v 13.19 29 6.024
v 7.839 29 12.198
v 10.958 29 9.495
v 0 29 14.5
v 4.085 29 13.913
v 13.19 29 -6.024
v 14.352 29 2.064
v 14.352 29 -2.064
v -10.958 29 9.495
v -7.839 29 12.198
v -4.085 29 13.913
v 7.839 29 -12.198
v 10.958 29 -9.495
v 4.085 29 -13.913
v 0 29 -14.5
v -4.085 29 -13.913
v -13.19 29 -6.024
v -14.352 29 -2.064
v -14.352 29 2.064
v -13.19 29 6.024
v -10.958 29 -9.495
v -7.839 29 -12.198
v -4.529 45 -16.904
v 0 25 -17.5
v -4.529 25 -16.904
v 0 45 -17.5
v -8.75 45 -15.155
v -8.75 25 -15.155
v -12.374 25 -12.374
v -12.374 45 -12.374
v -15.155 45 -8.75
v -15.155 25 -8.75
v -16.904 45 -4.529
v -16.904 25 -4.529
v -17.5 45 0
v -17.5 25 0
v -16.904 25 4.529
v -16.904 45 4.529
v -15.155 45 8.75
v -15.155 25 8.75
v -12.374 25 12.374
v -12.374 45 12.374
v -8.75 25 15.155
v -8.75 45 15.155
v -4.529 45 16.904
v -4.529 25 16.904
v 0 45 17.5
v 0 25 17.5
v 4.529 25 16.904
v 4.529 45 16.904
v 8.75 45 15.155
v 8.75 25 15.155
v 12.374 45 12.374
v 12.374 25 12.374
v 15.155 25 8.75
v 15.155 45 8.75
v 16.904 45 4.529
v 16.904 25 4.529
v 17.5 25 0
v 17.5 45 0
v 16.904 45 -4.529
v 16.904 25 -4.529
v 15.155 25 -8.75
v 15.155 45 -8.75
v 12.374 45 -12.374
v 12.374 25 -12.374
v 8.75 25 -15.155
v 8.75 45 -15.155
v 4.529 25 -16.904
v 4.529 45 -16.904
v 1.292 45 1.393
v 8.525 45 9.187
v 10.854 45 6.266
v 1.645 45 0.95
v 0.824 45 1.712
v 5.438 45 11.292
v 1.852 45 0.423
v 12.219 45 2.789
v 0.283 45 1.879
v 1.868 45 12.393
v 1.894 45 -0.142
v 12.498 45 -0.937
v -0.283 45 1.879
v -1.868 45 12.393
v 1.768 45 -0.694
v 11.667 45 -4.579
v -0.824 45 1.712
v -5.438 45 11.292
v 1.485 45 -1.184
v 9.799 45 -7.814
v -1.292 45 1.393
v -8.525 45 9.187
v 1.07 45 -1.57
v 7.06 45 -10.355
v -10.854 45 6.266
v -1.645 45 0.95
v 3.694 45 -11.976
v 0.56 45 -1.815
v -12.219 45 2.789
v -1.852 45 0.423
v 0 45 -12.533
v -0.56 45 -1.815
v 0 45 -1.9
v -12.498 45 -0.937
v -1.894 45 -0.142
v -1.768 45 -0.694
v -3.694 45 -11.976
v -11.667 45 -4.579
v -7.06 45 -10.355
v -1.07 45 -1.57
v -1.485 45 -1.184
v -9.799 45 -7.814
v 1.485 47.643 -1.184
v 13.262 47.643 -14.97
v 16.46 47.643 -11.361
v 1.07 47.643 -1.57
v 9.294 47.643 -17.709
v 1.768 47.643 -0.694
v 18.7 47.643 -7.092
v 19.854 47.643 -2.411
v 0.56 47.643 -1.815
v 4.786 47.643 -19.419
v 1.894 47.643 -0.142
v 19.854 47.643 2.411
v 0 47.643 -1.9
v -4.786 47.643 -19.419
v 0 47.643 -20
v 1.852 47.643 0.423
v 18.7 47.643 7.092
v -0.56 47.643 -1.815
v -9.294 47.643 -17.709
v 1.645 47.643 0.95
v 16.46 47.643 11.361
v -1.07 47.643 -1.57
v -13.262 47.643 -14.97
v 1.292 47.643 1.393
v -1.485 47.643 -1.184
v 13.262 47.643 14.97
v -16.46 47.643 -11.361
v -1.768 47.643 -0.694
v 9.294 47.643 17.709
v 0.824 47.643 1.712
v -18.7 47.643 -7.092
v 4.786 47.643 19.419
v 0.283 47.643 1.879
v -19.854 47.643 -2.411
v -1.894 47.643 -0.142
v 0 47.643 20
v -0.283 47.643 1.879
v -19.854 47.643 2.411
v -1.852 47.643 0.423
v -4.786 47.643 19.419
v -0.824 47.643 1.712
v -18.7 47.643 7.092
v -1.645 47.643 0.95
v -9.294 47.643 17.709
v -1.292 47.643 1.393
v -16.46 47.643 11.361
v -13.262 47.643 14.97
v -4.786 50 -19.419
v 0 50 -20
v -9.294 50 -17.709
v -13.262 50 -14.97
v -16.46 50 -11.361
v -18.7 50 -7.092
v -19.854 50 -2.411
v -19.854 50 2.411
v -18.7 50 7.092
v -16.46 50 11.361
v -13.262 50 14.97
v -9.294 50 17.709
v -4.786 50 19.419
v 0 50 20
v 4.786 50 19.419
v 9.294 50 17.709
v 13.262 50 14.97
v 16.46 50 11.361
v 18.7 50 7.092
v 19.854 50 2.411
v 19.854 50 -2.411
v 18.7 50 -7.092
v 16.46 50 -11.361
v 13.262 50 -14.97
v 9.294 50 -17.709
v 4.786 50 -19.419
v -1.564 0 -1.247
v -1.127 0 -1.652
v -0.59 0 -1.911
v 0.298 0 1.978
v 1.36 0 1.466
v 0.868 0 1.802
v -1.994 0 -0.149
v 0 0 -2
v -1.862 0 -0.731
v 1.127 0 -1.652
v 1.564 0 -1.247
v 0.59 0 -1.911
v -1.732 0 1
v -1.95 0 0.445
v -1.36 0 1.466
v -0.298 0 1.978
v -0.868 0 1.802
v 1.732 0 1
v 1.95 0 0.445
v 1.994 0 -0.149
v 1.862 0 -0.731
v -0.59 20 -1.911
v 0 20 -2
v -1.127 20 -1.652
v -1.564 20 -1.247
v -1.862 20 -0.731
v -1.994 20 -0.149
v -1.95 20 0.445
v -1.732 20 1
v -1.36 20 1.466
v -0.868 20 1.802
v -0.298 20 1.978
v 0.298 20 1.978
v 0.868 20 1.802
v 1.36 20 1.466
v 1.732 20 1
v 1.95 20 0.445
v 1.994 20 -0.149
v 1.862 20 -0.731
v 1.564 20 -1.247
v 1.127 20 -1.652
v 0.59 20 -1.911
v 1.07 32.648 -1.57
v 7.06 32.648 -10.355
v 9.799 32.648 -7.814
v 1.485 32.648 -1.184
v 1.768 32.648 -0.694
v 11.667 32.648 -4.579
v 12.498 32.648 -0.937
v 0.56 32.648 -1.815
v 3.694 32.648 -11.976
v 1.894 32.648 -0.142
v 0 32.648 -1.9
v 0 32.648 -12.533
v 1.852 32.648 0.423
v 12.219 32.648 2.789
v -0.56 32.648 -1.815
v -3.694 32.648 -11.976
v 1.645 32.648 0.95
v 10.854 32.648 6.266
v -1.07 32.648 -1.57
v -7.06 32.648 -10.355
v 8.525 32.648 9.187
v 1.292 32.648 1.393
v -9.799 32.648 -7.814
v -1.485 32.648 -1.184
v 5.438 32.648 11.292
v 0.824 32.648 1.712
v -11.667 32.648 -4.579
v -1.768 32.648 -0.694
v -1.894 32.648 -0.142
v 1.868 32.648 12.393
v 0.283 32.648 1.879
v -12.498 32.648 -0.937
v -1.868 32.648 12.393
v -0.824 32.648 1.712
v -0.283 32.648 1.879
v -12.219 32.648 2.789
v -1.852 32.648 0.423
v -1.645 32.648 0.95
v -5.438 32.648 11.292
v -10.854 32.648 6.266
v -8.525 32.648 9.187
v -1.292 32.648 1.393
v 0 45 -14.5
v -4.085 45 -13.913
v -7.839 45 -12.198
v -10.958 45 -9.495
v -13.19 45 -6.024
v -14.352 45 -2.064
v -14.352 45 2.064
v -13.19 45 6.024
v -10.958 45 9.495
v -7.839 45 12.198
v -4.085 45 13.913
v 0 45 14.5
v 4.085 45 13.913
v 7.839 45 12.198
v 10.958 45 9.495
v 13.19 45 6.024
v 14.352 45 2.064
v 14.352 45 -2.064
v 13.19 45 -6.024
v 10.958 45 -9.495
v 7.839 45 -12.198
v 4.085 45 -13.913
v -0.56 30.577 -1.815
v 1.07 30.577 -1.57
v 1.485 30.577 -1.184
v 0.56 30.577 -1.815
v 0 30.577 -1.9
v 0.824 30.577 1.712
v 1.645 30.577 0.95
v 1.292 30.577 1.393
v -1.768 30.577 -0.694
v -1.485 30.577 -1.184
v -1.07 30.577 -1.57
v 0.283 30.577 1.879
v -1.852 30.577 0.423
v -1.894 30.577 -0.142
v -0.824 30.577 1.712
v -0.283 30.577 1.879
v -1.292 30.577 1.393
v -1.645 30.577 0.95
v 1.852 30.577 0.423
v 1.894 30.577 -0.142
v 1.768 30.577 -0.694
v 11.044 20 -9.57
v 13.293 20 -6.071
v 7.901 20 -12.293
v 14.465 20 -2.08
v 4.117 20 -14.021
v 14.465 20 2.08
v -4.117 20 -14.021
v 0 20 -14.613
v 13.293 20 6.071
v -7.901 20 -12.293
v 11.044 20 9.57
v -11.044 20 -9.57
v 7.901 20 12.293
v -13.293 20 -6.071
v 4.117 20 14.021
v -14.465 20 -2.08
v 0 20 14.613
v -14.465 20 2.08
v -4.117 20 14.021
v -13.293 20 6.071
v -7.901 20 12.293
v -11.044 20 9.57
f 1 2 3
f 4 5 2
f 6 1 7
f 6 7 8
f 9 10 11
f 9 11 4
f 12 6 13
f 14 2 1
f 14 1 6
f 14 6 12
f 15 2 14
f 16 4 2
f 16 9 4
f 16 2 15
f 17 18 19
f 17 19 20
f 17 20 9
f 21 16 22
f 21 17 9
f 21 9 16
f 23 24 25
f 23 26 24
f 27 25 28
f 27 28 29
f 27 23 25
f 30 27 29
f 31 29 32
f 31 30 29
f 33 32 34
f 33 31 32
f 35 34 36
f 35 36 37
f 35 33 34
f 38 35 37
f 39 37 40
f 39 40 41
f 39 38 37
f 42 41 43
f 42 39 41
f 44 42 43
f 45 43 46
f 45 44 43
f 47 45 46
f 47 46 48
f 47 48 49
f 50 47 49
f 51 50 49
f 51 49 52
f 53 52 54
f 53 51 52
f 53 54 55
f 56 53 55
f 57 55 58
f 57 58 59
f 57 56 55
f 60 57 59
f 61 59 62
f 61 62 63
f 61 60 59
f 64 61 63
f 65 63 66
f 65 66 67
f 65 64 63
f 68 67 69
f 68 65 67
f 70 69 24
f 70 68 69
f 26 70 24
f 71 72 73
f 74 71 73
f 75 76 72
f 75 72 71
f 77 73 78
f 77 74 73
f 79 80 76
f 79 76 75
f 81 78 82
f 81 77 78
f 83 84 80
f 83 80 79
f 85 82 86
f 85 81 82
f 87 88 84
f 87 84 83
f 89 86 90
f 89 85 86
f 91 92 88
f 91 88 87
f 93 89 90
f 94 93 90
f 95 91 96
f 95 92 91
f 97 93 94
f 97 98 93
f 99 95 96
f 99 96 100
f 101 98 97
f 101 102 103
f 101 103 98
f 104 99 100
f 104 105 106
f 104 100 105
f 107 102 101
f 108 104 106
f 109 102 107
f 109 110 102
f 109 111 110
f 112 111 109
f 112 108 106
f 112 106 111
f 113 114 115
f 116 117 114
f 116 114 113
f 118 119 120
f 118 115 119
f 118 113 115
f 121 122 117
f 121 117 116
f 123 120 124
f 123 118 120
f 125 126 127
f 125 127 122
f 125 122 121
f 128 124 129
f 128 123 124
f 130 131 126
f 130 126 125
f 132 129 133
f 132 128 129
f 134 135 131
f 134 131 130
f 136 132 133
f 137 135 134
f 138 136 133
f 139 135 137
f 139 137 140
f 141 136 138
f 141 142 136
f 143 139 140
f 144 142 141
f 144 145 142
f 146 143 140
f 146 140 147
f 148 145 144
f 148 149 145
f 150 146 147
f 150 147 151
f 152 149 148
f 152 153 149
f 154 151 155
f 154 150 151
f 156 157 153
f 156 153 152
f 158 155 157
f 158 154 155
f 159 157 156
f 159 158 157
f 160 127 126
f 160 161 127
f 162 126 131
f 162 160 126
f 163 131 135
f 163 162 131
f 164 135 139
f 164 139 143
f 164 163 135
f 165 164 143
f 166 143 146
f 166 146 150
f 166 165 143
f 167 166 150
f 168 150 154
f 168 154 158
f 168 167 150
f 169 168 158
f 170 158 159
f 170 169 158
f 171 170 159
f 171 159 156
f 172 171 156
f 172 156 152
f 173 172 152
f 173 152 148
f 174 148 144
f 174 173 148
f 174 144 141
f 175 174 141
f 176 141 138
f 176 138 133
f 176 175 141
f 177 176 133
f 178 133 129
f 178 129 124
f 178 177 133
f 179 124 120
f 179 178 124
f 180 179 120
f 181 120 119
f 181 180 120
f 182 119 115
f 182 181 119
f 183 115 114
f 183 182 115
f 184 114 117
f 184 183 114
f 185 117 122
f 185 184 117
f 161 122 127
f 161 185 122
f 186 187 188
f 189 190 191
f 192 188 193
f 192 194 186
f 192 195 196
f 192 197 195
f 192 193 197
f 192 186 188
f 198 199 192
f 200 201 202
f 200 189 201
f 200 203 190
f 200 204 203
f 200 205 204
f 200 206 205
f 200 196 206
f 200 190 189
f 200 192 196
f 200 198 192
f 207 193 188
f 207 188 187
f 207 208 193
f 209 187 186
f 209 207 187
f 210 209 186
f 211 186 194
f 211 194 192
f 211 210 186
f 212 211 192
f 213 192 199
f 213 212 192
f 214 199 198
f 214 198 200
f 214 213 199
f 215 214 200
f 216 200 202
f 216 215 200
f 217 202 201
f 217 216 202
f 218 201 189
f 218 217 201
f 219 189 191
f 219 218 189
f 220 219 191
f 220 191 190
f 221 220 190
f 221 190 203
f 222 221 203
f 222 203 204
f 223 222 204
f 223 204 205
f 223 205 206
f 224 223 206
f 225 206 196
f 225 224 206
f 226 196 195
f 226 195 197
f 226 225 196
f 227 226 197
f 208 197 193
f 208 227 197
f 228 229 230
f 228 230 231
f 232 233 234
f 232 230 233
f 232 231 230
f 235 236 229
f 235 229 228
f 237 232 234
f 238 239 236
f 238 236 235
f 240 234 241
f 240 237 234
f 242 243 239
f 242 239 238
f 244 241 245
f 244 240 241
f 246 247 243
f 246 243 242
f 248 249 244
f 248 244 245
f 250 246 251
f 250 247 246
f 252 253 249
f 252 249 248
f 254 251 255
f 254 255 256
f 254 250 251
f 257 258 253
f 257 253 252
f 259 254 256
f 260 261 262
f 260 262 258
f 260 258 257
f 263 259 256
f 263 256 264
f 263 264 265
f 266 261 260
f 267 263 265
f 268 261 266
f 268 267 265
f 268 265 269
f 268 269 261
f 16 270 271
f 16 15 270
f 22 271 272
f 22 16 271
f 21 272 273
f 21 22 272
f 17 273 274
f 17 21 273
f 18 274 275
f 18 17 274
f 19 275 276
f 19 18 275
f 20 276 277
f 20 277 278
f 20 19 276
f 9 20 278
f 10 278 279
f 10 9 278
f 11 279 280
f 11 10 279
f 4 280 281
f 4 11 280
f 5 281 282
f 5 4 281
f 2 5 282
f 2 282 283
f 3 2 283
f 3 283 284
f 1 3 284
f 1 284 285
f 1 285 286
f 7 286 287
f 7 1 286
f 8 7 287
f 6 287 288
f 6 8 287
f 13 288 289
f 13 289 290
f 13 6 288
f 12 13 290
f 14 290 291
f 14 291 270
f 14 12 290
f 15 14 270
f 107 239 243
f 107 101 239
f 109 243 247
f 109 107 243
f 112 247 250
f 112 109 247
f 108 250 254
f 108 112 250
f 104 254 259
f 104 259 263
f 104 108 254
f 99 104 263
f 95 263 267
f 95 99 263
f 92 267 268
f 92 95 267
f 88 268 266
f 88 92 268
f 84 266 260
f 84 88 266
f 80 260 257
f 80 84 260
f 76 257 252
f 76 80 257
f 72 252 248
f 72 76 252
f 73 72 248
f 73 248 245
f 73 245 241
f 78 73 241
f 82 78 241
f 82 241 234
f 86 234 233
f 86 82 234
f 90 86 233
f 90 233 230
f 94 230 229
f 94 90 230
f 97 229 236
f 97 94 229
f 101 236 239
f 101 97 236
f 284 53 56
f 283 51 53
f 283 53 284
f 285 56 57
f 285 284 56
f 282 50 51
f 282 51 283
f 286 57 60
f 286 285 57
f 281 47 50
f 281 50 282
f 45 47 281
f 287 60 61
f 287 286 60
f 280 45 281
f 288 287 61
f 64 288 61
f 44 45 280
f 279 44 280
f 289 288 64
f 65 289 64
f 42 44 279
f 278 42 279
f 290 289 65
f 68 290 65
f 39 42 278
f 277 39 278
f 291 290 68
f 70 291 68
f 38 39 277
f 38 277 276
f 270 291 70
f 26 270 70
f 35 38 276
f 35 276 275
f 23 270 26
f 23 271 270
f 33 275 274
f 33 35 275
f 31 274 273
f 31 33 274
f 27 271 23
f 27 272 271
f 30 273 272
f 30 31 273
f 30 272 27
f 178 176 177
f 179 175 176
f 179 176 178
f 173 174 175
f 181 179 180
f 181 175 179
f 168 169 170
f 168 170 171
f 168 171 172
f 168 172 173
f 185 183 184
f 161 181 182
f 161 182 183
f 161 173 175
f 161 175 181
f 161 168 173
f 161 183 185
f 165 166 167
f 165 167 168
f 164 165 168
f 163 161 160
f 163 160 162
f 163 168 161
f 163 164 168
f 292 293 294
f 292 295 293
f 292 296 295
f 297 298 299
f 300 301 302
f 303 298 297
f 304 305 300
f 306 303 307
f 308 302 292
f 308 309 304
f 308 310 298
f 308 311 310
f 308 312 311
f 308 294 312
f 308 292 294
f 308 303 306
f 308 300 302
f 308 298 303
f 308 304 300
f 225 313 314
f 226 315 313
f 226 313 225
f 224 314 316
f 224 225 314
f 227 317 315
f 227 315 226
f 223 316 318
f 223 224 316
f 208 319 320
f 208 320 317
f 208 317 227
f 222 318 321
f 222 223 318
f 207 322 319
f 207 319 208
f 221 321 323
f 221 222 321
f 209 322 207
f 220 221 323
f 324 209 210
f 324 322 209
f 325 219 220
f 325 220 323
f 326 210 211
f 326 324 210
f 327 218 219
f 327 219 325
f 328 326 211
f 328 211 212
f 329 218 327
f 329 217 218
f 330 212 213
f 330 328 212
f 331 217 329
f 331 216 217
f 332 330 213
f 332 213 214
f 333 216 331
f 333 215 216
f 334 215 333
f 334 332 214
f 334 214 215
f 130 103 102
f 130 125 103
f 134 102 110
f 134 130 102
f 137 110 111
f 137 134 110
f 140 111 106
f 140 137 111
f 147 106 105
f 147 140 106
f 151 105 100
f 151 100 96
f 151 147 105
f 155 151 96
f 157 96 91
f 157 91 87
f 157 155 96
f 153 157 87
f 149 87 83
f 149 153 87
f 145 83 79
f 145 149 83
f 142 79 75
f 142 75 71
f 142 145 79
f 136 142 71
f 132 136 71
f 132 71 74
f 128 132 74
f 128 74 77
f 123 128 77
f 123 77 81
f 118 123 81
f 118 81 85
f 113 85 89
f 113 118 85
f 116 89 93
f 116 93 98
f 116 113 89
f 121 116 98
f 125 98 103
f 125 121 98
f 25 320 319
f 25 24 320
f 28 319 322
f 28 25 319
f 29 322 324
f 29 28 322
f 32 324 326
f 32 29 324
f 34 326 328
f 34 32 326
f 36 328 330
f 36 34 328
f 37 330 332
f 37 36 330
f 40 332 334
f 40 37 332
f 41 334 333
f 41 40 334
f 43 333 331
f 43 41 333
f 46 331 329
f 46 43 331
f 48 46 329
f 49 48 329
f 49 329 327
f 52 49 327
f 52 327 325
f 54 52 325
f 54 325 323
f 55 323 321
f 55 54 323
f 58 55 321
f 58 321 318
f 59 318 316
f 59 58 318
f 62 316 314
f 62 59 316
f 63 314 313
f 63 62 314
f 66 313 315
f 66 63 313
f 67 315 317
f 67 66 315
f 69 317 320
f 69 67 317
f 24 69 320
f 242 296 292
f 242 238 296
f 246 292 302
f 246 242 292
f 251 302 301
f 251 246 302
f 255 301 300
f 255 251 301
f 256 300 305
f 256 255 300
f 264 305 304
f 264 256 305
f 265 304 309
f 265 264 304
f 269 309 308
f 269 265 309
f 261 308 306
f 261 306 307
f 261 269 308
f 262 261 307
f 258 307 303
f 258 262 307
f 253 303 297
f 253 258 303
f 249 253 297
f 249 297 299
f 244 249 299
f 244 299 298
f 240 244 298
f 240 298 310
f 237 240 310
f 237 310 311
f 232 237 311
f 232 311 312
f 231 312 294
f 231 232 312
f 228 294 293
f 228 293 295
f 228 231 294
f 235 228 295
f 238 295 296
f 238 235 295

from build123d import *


with BuildPart() as part:
    # Skica1 → Rotovat1 (revolve)
    with BuildSketch(Plane.XY, mode=Mode.PRIVATE) as rotovat1_sk:
        Polygon((0, 0), (2, 0), (2, 20), (14.613248654, 20), (17.5, 25), (17.5, 45), (14.5, 45), (14.5, 29), (0, 29), align=None)
    revolve(rotovat1_sk.sketch.rotate(Axis((0, 0, 0), (0, 1, 0)), 90), axis=Axis((0, 0, 0), (0, 1, 0)))


with BuildPart() as body_2:
    # Skica2 → Rotovat2 (revolve)
    with BuildSketch(Plane.XY, mode=Mode.PRIVATE) as rotovat2_sk:
        Polygon((0, 30.576655738), (1.899727241, 30.576655738), (1.899727241, 32.648069176), (12.532982887, 32.648069176), (12.532982887, 45), (1.899727241, 45), (1.899727241, 47.643201742), (20, 47.643201742), (20, 50), (0, 50), align=None)
    revolve(rotovat2_sk.sketch.rotate(Axis((0, 0, 0), (0, 1, 0)), 90), axis=Axis((0, 0, 0), (0, 1, 0)))


solid = Compound([part.part, body_2.part])
